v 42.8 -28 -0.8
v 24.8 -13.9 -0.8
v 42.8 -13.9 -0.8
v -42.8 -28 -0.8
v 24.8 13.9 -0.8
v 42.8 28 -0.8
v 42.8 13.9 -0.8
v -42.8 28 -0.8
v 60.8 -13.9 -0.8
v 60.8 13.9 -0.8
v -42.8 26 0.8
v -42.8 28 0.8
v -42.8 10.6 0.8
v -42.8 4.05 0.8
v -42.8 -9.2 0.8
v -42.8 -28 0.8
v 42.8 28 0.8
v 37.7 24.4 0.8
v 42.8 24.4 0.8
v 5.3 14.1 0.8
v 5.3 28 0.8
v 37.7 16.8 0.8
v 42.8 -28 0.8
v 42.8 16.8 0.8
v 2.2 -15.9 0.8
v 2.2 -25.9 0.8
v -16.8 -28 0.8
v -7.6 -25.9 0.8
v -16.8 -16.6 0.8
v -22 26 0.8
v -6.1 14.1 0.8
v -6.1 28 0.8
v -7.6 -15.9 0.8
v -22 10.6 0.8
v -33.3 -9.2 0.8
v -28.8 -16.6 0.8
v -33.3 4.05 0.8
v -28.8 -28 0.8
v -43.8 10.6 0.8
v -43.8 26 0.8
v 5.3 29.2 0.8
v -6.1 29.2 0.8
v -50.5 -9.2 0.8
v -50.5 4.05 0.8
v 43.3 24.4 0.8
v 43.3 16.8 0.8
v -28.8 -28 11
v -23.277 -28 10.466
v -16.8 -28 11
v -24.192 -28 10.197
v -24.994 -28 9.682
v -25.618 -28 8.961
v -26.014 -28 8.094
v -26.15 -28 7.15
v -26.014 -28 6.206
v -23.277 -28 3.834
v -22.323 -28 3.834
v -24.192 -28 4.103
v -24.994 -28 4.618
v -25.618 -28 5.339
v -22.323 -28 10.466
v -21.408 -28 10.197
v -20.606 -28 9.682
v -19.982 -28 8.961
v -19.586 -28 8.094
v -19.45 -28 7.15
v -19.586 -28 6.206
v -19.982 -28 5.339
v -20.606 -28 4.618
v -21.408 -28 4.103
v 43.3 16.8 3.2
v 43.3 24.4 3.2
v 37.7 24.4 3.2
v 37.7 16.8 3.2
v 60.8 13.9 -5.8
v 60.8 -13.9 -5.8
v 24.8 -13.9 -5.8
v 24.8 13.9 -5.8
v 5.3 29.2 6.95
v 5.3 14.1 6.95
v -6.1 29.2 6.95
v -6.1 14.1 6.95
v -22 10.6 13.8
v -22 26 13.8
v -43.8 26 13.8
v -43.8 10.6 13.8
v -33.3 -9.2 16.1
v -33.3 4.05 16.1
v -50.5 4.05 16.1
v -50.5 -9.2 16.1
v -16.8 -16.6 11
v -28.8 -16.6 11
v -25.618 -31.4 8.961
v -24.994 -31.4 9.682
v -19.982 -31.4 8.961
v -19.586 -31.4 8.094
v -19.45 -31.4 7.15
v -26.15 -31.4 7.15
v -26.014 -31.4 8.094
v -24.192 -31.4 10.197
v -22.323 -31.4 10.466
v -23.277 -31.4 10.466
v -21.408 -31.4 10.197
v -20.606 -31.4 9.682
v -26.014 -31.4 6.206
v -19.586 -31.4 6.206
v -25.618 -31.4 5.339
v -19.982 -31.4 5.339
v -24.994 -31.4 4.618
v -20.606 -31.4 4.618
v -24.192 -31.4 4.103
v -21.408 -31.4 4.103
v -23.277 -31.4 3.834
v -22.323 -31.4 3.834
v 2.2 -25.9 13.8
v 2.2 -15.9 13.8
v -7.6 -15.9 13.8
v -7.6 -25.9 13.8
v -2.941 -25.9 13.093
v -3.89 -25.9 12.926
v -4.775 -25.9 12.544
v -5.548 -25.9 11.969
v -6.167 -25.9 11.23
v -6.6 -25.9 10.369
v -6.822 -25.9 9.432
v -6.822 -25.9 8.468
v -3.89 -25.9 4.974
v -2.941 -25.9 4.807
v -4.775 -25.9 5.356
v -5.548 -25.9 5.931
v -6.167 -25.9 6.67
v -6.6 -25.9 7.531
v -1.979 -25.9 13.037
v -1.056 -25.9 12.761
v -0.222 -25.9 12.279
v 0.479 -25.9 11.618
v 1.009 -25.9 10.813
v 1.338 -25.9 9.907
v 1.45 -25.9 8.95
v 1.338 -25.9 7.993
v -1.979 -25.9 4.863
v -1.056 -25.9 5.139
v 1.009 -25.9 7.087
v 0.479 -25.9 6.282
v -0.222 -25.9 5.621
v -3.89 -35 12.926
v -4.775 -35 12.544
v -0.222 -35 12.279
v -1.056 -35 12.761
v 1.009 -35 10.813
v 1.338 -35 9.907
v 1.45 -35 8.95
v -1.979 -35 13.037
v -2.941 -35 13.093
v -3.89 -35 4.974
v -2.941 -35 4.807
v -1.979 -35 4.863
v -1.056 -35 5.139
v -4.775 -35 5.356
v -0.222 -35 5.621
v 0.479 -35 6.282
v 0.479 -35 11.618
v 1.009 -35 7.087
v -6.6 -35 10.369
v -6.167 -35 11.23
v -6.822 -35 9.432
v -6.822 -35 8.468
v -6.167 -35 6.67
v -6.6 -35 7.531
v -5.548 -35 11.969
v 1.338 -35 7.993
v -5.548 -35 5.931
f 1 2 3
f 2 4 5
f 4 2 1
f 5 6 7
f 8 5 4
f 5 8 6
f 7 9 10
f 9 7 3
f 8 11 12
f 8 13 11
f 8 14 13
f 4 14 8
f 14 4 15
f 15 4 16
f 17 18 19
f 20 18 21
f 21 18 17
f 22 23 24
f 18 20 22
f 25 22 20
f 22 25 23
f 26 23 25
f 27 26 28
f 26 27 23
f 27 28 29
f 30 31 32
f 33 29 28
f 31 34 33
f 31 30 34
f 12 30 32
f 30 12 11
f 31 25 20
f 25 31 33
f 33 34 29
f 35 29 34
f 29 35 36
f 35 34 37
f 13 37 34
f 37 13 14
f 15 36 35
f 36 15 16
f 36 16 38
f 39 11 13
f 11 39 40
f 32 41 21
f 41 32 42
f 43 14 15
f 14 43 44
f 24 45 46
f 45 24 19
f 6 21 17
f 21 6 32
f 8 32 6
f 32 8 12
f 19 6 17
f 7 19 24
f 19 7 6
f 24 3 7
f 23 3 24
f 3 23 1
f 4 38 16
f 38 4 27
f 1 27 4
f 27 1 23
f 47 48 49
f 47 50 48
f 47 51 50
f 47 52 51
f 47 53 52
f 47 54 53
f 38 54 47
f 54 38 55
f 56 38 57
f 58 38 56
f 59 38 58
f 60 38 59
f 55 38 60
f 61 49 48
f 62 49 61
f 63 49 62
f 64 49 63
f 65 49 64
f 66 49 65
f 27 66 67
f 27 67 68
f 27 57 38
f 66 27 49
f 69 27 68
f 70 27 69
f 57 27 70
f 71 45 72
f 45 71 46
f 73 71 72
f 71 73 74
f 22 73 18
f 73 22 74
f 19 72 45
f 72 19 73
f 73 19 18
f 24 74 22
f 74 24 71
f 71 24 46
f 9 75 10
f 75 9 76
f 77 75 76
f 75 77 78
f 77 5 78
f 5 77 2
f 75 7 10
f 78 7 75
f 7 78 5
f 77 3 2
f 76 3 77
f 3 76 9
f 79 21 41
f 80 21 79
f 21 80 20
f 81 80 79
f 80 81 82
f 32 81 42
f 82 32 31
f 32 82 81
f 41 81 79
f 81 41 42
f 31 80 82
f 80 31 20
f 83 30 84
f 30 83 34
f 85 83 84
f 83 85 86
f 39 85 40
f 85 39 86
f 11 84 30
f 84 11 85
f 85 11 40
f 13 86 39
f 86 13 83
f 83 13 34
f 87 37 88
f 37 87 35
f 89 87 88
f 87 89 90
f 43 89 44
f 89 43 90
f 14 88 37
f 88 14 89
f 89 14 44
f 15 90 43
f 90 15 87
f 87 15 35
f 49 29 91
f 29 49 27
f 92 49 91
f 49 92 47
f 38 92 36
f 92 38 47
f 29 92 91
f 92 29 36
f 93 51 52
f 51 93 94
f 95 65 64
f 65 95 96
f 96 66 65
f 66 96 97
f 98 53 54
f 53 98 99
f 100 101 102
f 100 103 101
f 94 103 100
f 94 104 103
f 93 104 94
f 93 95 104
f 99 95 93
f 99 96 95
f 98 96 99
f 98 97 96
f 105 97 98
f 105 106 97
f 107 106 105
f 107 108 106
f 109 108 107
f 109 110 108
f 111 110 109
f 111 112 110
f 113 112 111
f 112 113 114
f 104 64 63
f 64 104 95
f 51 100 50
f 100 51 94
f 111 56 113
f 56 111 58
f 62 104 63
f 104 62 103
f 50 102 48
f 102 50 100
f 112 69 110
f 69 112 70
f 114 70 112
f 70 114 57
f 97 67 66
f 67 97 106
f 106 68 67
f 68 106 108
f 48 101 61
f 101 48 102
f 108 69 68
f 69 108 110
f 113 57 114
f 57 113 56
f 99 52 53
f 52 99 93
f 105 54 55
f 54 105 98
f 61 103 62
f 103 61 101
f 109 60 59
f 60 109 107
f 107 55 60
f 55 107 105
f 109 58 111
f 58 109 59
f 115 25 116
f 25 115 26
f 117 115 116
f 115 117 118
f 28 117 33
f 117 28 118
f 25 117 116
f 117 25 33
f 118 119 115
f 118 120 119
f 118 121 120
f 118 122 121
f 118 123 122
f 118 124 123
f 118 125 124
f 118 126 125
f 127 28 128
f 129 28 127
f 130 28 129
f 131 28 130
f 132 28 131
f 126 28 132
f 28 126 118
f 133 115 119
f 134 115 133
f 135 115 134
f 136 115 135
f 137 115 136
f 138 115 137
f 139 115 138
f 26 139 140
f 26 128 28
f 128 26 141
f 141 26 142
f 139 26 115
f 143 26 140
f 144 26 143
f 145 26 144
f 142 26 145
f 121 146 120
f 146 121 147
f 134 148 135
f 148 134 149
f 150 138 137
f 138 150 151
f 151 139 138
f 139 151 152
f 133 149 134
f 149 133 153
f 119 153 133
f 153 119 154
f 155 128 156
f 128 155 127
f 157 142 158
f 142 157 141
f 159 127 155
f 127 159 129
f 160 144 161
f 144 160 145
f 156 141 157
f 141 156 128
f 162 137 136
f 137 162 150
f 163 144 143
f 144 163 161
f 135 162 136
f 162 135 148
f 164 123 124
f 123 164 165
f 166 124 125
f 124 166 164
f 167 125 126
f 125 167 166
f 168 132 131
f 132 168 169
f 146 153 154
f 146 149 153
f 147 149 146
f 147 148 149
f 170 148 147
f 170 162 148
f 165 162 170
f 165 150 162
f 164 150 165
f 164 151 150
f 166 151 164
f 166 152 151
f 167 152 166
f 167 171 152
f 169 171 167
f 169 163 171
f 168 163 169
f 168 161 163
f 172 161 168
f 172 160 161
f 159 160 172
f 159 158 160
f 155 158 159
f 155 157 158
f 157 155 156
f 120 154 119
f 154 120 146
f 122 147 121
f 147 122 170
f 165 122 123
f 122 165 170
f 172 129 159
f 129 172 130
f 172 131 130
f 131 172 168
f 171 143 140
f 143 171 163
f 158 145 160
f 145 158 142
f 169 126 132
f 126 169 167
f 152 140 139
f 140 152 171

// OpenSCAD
module addElement(l, w, h, x, y, z) {
	translate([x, y, z])
		cube([l, w, h]);
}

boardLen=85.6;
boardWidth=56;
boardHeight=1.6;
boardTop=boardHeight/2;
boardBottom=-boardHeight/2;
topEdge=boardWidth/2;
bottomEdge=-boardWidth/2;
rightEdge=boardLen/2;
leftEdge=-boardLen/2;

linear_extrude(height = boardHeight, center = true, convexity = 10, twist = 0)
square ([boardLen,boardWidth],center = true);

powerLength=5.6;
powerWidth=7.6;
powerHeight=2.4;
translate([37.7,16.8,0.8]) 
	cube([powerLength,powerWidth,powerHeight]);

sdLength=36;
sdWidth=27.8;
sdHeight=5;
sdX=(boardLen/2) - (sdLength/2);
sdY=-(sdWidth/2);
sdZ=-((boardHeight/2) + sdHeight);
addElement(sdLength, sdWidth, sdHeight, sdX, sdY, sdZ);

hdmiLength=11.4;
hdmiWidth=15.1;
hdmiHeight=6.15;
hdmiX= (rightEdge-hdmiLength) - 37.5;
hdmiY= (topEdge - hdmiWidth) + 1.2;
hdmiZ=boardTop;
addElement(hdmiLength, hdmiWidth, hdmiHeight, hdmiX, hdmiY, hdmiZ);

usbLength = 21.8;
usbWidth = 15.4;
usbHeight = 13;
usbX = (leftEdge - usbLength) + (usbLength - 1);
usbY = (topEdge - usbWidth) -2;
usbZ = boardTop;
addElement(usbLength, usbWidth, usbHeight, usbX, usbY, usbZ);

ethernetLength = 17.2;
ethernetWidth = 13.25;
ethernetHeight = 15.3;
ethernetX = (leftEdge - ethernetLength) + (ethernetLength -7.7);
ethernetY = (bottomEdge) + 18.8;
ethernetZ = boardTop;
addElement(ethernetLength, ethernetWidth, ethernetHeight, ethernetX, ethernetY, ethernetZ);

audioLength = 12;
audioWidth = 11.4;
audioHeight = 10.2;
audioX = (leftEdge - audioLength) + (audioLength + 14);
audioY = (bottomEdge);
audioZ = boardTop;
addElement(audioLength, audioWidth, audioHeight, audioX, audioY, audioZ);

audioJackHeight = 3.4;
audioJackRadius = 6.7/2;
translate([(leftEdge + 14 + (audioLength/2)), bottomEdge, (boardTop + audioJackRadius + 3)])
	rotate(a=[90,0,0])
		cylinder(h=audioJackHeight, r=audioJackRadius, $fs=1);

rsaLength = 9.8;
rsaWidth = 10;
rsaHeight = 13;
rsaX = (rightEdge - rsaLength) - 40.6;
rsaY = (bottomEdge + 2.1);
rsaZ = boardTop;
addElement(rsaLength, rsaWidth, rsaHeight, rsaX, rsaY, rsaZ);

rsaJackHeight = 9.1;
rsaJackRadius = 8.3/2;
translate([(rightEdge - (rsaLength/2) - 40.6), bottomEdge + 2.1, (boardTop + rsaJackRadius + 4)])
	rotate(a=[90,0,0])
		cylinder(h=rsaJackHeight, r=rsaJackRadius, $fs=1);
